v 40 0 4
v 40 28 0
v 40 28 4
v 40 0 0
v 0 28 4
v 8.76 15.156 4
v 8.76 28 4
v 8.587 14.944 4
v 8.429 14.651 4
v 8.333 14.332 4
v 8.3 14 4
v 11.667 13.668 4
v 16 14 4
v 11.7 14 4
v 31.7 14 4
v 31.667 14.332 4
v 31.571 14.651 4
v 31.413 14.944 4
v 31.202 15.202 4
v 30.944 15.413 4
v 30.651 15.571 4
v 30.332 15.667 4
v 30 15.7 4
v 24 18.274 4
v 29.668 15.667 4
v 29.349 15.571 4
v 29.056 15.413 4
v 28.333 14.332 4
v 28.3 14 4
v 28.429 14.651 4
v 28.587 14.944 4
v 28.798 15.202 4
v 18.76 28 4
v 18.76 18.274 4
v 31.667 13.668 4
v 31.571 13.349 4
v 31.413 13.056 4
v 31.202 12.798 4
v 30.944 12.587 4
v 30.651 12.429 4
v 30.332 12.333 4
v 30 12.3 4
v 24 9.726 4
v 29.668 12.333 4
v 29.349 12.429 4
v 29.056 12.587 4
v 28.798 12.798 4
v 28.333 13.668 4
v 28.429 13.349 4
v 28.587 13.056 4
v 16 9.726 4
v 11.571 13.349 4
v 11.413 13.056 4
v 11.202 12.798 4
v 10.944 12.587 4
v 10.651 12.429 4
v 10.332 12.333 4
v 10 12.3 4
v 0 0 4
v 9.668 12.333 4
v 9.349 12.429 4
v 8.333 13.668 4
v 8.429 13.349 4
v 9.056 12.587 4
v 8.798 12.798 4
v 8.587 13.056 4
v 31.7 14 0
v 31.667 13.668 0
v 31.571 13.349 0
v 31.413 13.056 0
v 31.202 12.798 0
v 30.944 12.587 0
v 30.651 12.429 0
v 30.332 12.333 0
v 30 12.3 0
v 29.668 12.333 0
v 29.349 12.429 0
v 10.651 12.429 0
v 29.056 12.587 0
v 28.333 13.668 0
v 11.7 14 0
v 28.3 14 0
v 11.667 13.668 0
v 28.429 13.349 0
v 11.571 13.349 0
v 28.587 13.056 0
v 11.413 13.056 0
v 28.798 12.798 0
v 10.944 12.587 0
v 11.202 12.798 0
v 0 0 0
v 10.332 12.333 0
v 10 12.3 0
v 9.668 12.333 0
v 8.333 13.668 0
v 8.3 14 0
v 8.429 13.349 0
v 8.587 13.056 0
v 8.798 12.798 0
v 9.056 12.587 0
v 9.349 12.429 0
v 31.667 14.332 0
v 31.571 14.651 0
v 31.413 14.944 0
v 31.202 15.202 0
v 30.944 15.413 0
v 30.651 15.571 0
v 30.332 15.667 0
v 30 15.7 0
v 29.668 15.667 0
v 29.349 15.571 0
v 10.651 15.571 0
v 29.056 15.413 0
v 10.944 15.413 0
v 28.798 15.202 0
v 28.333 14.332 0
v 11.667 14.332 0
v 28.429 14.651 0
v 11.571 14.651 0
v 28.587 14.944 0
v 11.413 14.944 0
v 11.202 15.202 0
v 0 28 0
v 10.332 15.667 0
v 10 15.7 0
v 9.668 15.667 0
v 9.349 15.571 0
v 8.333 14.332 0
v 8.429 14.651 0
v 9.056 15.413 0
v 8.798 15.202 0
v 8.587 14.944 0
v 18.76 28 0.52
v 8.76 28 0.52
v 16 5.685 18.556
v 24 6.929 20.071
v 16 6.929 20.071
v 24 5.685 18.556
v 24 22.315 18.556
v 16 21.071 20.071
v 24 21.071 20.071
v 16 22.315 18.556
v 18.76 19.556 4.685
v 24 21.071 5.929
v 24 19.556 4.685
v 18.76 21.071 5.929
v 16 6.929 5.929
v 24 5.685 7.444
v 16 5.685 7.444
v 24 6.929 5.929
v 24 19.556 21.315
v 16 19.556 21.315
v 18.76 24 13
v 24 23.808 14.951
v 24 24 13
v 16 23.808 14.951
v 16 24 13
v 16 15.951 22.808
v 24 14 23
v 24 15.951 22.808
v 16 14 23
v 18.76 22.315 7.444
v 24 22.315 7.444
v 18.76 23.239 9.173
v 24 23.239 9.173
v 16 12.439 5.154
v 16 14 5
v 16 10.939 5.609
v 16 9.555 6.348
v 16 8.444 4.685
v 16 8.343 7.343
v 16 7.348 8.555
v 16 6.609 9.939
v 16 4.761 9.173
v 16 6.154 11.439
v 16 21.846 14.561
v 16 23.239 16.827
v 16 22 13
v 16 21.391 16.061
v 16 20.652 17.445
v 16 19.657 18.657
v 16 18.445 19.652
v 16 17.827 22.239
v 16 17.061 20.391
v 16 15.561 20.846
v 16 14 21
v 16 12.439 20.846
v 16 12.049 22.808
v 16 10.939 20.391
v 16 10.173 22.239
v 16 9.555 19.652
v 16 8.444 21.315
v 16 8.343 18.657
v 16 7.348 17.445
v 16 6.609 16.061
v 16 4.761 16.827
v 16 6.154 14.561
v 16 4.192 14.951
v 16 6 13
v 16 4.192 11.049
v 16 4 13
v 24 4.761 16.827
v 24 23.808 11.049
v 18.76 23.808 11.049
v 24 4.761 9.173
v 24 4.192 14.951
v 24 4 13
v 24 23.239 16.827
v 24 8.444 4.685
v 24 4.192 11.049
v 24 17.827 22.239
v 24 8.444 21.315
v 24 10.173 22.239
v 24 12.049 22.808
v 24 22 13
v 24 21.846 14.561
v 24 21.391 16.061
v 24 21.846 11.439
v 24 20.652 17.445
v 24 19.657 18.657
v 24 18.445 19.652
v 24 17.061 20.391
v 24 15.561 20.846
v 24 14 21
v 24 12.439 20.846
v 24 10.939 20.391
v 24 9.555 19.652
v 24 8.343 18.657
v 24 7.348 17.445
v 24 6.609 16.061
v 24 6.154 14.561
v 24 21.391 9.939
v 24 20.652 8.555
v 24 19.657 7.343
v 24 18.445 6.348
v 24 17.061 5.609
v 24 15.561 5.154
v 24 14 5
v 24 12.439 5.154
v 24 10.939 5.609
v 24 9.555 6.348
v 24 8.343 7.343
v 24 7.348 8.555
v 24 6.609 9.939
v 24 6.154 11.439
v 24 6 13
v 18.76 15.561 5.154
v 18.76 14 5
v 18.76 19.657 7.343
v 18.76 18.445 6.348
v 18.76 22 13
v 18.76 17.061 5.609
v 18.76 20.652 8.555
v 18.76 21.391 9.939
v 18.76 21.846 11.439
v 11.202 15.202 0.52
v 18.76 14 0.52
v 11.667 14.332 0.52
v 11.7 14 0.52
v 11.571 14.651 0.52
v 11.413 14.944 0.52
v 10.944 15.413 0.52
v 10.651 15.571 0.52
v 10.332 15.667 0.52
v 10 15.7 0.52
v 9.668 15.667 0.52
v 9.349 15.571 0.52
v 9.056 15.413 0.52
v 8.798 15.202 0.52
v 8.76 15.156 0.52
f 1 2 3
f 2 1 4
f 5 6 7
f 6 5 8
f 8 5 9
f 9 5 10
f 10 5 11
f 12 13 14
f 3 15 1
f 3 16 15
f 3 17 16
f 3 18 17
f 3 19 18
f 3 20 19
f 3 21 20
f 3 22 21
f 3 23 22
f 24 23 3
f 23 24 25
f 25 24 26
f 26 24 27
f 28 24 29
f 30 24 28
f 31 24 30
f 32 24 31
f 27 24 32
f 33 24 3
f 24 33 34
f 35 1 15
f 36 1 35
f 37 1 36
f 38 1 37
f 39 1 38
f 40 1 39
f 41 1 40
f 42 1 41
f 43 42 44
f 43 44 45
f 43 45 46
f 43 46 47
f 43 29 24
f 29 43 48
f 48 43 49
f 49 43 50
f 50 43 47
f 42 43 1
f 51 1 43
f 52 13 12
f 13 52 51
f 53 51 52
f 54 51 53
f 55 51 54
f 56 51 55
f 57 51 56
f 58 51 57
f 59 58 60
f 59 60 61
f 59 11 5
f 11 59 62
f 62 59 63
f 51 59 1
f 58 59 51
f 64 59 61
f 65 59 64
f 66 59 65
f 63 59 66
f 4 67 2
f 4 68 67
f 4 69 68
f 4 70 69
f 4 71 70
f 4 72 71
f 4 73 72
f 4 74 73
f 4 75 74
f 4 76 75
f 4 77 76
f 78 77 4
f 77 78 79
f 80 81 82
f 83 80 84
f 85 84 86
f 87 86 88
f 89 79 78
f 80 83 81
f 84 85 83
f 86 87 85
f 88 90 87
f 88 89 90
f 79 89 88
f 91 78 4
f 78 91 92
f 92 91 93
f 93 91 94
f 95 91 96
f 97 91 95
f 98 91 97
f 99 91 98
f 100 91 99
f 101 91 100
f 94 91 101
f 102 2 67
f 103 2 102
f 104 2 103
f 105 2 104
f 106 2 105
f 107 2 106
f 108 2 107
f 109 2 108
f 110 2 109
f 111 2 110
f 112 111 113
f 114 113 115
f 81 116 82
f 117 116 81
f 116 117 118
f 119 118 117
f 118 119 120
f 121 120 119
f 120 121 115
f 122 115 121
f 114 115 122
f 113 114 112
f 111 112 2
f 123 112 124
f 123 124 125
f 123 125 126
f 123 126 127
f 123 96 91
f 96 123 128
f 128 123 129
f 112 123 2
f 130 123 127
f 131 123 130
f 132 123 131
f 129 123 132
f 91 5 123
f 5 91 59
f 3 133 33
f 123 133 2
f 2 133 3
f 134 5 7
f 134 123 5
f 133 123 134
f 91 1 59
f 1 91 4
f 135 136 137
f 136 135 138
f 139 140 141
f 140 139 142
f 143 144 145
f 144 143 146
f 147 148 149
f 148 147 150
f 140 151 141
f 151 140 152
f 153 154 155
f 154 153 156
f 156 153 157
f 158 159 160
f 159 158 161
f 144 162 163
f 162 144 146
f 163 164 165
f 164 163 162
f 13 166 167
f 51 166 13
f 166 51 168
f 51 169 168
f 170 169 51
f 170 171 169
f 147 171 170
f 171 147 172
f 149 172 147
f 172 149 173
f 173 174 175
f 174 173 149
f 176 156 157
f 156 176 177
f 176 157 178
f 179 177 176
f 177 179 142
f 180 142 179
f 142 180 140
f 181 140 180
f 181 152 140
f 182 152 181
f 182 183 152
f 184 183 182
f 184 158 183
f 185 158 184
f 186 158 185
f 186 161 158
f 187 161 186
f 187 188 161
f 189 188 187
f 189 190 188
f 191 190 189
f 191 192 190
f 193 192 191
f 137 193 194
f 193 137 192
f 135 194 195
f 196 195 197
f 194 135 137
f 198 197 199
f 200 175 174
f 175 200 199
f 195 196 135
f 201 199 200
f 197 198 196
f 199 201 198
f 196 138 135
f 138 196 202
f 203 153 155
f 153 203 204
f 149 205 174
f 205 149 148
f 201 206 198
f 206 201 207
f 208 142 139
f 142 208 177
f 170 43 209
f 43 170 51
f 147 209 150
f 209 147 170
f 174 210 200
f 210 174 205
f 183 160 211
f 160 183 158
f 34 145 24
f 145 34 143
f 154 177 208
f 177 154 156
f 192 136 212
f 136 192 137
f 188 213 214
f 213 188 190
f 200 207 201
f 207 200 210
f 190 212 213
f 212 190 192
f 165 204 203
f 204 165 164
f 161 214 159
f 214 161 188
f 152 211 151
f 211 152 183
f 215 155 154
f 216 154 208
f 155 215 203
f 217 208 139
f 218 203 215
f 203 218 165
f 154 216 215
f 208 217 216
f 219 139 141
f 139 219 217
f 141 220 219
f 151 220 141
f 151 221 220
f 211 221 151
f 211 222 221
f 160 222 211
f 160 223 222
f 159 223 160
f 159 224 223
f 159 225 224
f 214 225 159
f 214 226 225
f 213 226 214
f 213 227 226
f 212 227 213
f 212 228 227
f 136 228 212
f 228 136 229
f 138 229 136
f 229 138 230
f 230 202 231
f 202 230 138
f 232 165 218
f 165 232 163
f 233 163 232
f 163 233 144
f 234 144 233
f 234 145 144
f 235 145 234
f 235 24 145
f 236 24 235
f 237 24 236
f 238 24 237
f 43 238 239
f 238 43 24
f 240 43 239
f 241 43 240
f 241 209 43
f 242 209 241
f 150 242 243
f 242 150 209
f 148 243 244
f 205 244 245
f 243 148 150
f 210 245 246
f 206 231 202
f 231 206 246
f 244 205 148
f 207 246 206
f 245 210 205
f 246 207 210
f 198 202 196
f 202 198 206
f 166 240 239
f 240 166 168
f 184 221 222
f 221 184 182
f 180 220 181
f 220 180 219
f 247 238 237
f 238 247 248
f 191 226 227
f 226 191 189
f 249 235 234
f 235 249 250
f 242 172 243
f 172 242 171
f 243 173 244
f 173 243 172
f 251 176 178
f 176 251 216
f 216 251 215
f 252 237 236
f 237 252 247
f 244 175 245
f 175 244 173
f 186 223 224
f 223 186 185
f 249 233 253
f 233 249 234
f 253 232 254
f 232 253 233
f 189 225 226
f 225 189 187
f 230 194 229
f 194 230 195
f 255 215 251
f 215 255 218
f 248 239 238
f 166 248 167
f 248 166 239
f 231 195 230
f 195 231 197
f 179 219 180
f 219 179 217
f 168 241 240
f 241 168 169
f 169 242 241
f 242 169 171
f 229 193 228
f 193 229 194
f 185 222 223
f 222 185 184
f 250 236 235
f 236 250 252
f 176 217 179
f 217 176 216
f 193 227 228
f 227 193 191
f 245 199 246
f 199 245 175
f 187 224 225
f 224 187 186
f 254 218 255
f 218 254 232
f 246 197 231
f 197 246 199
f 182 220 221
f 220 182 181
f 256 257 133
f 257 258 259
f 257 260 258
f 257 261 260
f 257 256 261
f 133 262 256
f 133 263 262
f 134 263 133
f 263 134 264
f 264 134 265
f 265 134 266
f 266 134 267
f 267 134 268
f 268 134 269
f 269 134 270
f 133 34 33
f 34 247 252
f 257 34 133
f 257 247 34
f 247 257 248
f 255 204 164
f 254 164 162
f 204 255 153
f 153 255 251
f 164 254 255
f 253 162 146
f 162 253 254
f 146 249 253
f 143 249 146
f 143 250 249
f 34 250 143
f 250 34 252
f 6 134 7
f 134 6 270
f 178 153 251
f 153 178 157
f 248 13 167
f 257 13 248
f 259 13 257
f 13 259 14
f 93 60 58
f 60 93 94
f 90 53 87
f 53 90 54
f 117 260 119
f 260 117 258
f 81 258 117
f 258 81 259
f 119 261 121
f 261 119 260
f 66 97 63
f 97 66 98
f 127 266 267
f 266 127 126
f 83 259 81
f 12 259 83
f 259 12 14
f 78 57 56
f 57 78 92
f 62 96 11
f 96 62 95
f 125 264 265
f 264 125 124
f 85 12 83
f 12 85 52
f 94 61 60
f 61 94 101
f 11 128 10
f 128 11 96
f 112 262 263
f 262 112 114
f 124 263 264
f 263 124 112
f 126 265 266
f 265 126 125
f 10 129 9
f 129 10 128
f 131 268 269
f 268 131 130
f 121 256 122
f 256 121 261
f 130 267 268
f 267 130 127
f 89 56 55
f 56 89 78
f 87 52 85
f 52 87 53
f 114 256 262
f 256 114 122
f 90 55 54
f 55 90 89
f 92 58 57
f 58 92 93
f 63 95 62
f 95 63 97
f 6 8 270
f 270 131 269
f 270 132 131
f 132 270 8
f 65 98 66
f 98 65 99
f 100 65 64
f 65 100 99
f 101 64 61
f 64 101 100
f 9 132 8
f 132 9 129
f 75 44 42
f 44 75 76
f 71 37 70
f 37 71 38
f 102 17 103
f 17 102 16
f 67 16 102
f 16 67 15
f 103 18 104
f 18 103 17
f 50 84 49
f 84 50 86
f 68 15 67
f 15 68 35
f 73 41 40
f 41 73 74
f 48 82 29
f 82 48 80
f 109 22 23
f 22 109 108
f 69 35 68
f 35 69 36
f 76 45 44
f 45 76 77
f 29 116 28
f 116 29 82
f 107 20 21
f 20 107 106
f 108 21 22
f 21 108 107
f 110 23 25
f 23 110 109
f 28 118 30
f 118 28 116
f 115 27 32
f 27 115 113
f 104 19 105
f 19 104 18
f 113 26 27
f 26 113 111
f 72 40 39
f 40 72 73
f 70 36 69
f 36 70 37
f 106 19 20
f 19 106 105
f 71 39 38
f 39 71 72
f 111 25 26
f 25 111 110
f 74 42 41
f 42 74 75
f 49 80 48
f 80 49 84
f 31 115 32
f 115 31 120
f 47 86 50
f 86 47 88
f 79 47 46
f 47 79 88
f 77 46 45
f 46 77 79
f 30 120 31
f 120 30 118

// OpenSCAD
$fn = 32;

// ----------------------------------------------------------------------
// Cable clip: cable 16 mm, clamp 20 mm, base 40 mm
// ----------------------------------------------------------------------

// --- parameters (mm) ---
foot_w = 40;              // base length, X
foot_d = 28;              // base width, Y
foot_t = 4;               // base thickness
hose_seat_d = 20;         // clamp outside diameter
ring_t = 2;               // clamp wall
cable_d = 16;             // cable opening
ring_w = 8;               // clamp width along the cable
screw_d = 3.4;            // screw clearance
throat = 12.48;           // snap throat width
sink = 1;                 // overlap of the clamp into the base

module base() {
  cube([foot_w, foot_d, foot_t]);
}

module clamp() {
  translate([foot_w / 2, foot_d / 2, foot_t + hose_seat_d / 2 - sink]) rotate([0, 90, 0])
    cylinder(h = ring_w, d = hose_seat_d, center = true);
}

difference() {
  union() {
    base();
    clamp();
  }
  translate([foot_w / 2, foot_d / 2, foot_t + hose_seat_d / 2 - sink]) rotate([0, 90, 0]) translate([0, 0, -ring_w / 2 - 1]) cylinder(h = ring_w + 2, d = cable_d);
  /* snap throat: the opening is narrower than the cable */
  translate([foot_w / 2 - throat / 2, foot_d / 2, foot_t + hose_seat_d / 2 - sink]) rotate([0, 90, 0]) translate([0, 0, -ring_w / 2 - 1]) cube([throat, hose_seat_d + 2, ring_w + 2]);
  translate([10, foot_d / 2, -1]) cylinder(h = foot_t + 2, d = screw_d);
  translate([30, foot_d / 2, -1]) cylinder(h = foot_t + 2, d = screw_d);
}
